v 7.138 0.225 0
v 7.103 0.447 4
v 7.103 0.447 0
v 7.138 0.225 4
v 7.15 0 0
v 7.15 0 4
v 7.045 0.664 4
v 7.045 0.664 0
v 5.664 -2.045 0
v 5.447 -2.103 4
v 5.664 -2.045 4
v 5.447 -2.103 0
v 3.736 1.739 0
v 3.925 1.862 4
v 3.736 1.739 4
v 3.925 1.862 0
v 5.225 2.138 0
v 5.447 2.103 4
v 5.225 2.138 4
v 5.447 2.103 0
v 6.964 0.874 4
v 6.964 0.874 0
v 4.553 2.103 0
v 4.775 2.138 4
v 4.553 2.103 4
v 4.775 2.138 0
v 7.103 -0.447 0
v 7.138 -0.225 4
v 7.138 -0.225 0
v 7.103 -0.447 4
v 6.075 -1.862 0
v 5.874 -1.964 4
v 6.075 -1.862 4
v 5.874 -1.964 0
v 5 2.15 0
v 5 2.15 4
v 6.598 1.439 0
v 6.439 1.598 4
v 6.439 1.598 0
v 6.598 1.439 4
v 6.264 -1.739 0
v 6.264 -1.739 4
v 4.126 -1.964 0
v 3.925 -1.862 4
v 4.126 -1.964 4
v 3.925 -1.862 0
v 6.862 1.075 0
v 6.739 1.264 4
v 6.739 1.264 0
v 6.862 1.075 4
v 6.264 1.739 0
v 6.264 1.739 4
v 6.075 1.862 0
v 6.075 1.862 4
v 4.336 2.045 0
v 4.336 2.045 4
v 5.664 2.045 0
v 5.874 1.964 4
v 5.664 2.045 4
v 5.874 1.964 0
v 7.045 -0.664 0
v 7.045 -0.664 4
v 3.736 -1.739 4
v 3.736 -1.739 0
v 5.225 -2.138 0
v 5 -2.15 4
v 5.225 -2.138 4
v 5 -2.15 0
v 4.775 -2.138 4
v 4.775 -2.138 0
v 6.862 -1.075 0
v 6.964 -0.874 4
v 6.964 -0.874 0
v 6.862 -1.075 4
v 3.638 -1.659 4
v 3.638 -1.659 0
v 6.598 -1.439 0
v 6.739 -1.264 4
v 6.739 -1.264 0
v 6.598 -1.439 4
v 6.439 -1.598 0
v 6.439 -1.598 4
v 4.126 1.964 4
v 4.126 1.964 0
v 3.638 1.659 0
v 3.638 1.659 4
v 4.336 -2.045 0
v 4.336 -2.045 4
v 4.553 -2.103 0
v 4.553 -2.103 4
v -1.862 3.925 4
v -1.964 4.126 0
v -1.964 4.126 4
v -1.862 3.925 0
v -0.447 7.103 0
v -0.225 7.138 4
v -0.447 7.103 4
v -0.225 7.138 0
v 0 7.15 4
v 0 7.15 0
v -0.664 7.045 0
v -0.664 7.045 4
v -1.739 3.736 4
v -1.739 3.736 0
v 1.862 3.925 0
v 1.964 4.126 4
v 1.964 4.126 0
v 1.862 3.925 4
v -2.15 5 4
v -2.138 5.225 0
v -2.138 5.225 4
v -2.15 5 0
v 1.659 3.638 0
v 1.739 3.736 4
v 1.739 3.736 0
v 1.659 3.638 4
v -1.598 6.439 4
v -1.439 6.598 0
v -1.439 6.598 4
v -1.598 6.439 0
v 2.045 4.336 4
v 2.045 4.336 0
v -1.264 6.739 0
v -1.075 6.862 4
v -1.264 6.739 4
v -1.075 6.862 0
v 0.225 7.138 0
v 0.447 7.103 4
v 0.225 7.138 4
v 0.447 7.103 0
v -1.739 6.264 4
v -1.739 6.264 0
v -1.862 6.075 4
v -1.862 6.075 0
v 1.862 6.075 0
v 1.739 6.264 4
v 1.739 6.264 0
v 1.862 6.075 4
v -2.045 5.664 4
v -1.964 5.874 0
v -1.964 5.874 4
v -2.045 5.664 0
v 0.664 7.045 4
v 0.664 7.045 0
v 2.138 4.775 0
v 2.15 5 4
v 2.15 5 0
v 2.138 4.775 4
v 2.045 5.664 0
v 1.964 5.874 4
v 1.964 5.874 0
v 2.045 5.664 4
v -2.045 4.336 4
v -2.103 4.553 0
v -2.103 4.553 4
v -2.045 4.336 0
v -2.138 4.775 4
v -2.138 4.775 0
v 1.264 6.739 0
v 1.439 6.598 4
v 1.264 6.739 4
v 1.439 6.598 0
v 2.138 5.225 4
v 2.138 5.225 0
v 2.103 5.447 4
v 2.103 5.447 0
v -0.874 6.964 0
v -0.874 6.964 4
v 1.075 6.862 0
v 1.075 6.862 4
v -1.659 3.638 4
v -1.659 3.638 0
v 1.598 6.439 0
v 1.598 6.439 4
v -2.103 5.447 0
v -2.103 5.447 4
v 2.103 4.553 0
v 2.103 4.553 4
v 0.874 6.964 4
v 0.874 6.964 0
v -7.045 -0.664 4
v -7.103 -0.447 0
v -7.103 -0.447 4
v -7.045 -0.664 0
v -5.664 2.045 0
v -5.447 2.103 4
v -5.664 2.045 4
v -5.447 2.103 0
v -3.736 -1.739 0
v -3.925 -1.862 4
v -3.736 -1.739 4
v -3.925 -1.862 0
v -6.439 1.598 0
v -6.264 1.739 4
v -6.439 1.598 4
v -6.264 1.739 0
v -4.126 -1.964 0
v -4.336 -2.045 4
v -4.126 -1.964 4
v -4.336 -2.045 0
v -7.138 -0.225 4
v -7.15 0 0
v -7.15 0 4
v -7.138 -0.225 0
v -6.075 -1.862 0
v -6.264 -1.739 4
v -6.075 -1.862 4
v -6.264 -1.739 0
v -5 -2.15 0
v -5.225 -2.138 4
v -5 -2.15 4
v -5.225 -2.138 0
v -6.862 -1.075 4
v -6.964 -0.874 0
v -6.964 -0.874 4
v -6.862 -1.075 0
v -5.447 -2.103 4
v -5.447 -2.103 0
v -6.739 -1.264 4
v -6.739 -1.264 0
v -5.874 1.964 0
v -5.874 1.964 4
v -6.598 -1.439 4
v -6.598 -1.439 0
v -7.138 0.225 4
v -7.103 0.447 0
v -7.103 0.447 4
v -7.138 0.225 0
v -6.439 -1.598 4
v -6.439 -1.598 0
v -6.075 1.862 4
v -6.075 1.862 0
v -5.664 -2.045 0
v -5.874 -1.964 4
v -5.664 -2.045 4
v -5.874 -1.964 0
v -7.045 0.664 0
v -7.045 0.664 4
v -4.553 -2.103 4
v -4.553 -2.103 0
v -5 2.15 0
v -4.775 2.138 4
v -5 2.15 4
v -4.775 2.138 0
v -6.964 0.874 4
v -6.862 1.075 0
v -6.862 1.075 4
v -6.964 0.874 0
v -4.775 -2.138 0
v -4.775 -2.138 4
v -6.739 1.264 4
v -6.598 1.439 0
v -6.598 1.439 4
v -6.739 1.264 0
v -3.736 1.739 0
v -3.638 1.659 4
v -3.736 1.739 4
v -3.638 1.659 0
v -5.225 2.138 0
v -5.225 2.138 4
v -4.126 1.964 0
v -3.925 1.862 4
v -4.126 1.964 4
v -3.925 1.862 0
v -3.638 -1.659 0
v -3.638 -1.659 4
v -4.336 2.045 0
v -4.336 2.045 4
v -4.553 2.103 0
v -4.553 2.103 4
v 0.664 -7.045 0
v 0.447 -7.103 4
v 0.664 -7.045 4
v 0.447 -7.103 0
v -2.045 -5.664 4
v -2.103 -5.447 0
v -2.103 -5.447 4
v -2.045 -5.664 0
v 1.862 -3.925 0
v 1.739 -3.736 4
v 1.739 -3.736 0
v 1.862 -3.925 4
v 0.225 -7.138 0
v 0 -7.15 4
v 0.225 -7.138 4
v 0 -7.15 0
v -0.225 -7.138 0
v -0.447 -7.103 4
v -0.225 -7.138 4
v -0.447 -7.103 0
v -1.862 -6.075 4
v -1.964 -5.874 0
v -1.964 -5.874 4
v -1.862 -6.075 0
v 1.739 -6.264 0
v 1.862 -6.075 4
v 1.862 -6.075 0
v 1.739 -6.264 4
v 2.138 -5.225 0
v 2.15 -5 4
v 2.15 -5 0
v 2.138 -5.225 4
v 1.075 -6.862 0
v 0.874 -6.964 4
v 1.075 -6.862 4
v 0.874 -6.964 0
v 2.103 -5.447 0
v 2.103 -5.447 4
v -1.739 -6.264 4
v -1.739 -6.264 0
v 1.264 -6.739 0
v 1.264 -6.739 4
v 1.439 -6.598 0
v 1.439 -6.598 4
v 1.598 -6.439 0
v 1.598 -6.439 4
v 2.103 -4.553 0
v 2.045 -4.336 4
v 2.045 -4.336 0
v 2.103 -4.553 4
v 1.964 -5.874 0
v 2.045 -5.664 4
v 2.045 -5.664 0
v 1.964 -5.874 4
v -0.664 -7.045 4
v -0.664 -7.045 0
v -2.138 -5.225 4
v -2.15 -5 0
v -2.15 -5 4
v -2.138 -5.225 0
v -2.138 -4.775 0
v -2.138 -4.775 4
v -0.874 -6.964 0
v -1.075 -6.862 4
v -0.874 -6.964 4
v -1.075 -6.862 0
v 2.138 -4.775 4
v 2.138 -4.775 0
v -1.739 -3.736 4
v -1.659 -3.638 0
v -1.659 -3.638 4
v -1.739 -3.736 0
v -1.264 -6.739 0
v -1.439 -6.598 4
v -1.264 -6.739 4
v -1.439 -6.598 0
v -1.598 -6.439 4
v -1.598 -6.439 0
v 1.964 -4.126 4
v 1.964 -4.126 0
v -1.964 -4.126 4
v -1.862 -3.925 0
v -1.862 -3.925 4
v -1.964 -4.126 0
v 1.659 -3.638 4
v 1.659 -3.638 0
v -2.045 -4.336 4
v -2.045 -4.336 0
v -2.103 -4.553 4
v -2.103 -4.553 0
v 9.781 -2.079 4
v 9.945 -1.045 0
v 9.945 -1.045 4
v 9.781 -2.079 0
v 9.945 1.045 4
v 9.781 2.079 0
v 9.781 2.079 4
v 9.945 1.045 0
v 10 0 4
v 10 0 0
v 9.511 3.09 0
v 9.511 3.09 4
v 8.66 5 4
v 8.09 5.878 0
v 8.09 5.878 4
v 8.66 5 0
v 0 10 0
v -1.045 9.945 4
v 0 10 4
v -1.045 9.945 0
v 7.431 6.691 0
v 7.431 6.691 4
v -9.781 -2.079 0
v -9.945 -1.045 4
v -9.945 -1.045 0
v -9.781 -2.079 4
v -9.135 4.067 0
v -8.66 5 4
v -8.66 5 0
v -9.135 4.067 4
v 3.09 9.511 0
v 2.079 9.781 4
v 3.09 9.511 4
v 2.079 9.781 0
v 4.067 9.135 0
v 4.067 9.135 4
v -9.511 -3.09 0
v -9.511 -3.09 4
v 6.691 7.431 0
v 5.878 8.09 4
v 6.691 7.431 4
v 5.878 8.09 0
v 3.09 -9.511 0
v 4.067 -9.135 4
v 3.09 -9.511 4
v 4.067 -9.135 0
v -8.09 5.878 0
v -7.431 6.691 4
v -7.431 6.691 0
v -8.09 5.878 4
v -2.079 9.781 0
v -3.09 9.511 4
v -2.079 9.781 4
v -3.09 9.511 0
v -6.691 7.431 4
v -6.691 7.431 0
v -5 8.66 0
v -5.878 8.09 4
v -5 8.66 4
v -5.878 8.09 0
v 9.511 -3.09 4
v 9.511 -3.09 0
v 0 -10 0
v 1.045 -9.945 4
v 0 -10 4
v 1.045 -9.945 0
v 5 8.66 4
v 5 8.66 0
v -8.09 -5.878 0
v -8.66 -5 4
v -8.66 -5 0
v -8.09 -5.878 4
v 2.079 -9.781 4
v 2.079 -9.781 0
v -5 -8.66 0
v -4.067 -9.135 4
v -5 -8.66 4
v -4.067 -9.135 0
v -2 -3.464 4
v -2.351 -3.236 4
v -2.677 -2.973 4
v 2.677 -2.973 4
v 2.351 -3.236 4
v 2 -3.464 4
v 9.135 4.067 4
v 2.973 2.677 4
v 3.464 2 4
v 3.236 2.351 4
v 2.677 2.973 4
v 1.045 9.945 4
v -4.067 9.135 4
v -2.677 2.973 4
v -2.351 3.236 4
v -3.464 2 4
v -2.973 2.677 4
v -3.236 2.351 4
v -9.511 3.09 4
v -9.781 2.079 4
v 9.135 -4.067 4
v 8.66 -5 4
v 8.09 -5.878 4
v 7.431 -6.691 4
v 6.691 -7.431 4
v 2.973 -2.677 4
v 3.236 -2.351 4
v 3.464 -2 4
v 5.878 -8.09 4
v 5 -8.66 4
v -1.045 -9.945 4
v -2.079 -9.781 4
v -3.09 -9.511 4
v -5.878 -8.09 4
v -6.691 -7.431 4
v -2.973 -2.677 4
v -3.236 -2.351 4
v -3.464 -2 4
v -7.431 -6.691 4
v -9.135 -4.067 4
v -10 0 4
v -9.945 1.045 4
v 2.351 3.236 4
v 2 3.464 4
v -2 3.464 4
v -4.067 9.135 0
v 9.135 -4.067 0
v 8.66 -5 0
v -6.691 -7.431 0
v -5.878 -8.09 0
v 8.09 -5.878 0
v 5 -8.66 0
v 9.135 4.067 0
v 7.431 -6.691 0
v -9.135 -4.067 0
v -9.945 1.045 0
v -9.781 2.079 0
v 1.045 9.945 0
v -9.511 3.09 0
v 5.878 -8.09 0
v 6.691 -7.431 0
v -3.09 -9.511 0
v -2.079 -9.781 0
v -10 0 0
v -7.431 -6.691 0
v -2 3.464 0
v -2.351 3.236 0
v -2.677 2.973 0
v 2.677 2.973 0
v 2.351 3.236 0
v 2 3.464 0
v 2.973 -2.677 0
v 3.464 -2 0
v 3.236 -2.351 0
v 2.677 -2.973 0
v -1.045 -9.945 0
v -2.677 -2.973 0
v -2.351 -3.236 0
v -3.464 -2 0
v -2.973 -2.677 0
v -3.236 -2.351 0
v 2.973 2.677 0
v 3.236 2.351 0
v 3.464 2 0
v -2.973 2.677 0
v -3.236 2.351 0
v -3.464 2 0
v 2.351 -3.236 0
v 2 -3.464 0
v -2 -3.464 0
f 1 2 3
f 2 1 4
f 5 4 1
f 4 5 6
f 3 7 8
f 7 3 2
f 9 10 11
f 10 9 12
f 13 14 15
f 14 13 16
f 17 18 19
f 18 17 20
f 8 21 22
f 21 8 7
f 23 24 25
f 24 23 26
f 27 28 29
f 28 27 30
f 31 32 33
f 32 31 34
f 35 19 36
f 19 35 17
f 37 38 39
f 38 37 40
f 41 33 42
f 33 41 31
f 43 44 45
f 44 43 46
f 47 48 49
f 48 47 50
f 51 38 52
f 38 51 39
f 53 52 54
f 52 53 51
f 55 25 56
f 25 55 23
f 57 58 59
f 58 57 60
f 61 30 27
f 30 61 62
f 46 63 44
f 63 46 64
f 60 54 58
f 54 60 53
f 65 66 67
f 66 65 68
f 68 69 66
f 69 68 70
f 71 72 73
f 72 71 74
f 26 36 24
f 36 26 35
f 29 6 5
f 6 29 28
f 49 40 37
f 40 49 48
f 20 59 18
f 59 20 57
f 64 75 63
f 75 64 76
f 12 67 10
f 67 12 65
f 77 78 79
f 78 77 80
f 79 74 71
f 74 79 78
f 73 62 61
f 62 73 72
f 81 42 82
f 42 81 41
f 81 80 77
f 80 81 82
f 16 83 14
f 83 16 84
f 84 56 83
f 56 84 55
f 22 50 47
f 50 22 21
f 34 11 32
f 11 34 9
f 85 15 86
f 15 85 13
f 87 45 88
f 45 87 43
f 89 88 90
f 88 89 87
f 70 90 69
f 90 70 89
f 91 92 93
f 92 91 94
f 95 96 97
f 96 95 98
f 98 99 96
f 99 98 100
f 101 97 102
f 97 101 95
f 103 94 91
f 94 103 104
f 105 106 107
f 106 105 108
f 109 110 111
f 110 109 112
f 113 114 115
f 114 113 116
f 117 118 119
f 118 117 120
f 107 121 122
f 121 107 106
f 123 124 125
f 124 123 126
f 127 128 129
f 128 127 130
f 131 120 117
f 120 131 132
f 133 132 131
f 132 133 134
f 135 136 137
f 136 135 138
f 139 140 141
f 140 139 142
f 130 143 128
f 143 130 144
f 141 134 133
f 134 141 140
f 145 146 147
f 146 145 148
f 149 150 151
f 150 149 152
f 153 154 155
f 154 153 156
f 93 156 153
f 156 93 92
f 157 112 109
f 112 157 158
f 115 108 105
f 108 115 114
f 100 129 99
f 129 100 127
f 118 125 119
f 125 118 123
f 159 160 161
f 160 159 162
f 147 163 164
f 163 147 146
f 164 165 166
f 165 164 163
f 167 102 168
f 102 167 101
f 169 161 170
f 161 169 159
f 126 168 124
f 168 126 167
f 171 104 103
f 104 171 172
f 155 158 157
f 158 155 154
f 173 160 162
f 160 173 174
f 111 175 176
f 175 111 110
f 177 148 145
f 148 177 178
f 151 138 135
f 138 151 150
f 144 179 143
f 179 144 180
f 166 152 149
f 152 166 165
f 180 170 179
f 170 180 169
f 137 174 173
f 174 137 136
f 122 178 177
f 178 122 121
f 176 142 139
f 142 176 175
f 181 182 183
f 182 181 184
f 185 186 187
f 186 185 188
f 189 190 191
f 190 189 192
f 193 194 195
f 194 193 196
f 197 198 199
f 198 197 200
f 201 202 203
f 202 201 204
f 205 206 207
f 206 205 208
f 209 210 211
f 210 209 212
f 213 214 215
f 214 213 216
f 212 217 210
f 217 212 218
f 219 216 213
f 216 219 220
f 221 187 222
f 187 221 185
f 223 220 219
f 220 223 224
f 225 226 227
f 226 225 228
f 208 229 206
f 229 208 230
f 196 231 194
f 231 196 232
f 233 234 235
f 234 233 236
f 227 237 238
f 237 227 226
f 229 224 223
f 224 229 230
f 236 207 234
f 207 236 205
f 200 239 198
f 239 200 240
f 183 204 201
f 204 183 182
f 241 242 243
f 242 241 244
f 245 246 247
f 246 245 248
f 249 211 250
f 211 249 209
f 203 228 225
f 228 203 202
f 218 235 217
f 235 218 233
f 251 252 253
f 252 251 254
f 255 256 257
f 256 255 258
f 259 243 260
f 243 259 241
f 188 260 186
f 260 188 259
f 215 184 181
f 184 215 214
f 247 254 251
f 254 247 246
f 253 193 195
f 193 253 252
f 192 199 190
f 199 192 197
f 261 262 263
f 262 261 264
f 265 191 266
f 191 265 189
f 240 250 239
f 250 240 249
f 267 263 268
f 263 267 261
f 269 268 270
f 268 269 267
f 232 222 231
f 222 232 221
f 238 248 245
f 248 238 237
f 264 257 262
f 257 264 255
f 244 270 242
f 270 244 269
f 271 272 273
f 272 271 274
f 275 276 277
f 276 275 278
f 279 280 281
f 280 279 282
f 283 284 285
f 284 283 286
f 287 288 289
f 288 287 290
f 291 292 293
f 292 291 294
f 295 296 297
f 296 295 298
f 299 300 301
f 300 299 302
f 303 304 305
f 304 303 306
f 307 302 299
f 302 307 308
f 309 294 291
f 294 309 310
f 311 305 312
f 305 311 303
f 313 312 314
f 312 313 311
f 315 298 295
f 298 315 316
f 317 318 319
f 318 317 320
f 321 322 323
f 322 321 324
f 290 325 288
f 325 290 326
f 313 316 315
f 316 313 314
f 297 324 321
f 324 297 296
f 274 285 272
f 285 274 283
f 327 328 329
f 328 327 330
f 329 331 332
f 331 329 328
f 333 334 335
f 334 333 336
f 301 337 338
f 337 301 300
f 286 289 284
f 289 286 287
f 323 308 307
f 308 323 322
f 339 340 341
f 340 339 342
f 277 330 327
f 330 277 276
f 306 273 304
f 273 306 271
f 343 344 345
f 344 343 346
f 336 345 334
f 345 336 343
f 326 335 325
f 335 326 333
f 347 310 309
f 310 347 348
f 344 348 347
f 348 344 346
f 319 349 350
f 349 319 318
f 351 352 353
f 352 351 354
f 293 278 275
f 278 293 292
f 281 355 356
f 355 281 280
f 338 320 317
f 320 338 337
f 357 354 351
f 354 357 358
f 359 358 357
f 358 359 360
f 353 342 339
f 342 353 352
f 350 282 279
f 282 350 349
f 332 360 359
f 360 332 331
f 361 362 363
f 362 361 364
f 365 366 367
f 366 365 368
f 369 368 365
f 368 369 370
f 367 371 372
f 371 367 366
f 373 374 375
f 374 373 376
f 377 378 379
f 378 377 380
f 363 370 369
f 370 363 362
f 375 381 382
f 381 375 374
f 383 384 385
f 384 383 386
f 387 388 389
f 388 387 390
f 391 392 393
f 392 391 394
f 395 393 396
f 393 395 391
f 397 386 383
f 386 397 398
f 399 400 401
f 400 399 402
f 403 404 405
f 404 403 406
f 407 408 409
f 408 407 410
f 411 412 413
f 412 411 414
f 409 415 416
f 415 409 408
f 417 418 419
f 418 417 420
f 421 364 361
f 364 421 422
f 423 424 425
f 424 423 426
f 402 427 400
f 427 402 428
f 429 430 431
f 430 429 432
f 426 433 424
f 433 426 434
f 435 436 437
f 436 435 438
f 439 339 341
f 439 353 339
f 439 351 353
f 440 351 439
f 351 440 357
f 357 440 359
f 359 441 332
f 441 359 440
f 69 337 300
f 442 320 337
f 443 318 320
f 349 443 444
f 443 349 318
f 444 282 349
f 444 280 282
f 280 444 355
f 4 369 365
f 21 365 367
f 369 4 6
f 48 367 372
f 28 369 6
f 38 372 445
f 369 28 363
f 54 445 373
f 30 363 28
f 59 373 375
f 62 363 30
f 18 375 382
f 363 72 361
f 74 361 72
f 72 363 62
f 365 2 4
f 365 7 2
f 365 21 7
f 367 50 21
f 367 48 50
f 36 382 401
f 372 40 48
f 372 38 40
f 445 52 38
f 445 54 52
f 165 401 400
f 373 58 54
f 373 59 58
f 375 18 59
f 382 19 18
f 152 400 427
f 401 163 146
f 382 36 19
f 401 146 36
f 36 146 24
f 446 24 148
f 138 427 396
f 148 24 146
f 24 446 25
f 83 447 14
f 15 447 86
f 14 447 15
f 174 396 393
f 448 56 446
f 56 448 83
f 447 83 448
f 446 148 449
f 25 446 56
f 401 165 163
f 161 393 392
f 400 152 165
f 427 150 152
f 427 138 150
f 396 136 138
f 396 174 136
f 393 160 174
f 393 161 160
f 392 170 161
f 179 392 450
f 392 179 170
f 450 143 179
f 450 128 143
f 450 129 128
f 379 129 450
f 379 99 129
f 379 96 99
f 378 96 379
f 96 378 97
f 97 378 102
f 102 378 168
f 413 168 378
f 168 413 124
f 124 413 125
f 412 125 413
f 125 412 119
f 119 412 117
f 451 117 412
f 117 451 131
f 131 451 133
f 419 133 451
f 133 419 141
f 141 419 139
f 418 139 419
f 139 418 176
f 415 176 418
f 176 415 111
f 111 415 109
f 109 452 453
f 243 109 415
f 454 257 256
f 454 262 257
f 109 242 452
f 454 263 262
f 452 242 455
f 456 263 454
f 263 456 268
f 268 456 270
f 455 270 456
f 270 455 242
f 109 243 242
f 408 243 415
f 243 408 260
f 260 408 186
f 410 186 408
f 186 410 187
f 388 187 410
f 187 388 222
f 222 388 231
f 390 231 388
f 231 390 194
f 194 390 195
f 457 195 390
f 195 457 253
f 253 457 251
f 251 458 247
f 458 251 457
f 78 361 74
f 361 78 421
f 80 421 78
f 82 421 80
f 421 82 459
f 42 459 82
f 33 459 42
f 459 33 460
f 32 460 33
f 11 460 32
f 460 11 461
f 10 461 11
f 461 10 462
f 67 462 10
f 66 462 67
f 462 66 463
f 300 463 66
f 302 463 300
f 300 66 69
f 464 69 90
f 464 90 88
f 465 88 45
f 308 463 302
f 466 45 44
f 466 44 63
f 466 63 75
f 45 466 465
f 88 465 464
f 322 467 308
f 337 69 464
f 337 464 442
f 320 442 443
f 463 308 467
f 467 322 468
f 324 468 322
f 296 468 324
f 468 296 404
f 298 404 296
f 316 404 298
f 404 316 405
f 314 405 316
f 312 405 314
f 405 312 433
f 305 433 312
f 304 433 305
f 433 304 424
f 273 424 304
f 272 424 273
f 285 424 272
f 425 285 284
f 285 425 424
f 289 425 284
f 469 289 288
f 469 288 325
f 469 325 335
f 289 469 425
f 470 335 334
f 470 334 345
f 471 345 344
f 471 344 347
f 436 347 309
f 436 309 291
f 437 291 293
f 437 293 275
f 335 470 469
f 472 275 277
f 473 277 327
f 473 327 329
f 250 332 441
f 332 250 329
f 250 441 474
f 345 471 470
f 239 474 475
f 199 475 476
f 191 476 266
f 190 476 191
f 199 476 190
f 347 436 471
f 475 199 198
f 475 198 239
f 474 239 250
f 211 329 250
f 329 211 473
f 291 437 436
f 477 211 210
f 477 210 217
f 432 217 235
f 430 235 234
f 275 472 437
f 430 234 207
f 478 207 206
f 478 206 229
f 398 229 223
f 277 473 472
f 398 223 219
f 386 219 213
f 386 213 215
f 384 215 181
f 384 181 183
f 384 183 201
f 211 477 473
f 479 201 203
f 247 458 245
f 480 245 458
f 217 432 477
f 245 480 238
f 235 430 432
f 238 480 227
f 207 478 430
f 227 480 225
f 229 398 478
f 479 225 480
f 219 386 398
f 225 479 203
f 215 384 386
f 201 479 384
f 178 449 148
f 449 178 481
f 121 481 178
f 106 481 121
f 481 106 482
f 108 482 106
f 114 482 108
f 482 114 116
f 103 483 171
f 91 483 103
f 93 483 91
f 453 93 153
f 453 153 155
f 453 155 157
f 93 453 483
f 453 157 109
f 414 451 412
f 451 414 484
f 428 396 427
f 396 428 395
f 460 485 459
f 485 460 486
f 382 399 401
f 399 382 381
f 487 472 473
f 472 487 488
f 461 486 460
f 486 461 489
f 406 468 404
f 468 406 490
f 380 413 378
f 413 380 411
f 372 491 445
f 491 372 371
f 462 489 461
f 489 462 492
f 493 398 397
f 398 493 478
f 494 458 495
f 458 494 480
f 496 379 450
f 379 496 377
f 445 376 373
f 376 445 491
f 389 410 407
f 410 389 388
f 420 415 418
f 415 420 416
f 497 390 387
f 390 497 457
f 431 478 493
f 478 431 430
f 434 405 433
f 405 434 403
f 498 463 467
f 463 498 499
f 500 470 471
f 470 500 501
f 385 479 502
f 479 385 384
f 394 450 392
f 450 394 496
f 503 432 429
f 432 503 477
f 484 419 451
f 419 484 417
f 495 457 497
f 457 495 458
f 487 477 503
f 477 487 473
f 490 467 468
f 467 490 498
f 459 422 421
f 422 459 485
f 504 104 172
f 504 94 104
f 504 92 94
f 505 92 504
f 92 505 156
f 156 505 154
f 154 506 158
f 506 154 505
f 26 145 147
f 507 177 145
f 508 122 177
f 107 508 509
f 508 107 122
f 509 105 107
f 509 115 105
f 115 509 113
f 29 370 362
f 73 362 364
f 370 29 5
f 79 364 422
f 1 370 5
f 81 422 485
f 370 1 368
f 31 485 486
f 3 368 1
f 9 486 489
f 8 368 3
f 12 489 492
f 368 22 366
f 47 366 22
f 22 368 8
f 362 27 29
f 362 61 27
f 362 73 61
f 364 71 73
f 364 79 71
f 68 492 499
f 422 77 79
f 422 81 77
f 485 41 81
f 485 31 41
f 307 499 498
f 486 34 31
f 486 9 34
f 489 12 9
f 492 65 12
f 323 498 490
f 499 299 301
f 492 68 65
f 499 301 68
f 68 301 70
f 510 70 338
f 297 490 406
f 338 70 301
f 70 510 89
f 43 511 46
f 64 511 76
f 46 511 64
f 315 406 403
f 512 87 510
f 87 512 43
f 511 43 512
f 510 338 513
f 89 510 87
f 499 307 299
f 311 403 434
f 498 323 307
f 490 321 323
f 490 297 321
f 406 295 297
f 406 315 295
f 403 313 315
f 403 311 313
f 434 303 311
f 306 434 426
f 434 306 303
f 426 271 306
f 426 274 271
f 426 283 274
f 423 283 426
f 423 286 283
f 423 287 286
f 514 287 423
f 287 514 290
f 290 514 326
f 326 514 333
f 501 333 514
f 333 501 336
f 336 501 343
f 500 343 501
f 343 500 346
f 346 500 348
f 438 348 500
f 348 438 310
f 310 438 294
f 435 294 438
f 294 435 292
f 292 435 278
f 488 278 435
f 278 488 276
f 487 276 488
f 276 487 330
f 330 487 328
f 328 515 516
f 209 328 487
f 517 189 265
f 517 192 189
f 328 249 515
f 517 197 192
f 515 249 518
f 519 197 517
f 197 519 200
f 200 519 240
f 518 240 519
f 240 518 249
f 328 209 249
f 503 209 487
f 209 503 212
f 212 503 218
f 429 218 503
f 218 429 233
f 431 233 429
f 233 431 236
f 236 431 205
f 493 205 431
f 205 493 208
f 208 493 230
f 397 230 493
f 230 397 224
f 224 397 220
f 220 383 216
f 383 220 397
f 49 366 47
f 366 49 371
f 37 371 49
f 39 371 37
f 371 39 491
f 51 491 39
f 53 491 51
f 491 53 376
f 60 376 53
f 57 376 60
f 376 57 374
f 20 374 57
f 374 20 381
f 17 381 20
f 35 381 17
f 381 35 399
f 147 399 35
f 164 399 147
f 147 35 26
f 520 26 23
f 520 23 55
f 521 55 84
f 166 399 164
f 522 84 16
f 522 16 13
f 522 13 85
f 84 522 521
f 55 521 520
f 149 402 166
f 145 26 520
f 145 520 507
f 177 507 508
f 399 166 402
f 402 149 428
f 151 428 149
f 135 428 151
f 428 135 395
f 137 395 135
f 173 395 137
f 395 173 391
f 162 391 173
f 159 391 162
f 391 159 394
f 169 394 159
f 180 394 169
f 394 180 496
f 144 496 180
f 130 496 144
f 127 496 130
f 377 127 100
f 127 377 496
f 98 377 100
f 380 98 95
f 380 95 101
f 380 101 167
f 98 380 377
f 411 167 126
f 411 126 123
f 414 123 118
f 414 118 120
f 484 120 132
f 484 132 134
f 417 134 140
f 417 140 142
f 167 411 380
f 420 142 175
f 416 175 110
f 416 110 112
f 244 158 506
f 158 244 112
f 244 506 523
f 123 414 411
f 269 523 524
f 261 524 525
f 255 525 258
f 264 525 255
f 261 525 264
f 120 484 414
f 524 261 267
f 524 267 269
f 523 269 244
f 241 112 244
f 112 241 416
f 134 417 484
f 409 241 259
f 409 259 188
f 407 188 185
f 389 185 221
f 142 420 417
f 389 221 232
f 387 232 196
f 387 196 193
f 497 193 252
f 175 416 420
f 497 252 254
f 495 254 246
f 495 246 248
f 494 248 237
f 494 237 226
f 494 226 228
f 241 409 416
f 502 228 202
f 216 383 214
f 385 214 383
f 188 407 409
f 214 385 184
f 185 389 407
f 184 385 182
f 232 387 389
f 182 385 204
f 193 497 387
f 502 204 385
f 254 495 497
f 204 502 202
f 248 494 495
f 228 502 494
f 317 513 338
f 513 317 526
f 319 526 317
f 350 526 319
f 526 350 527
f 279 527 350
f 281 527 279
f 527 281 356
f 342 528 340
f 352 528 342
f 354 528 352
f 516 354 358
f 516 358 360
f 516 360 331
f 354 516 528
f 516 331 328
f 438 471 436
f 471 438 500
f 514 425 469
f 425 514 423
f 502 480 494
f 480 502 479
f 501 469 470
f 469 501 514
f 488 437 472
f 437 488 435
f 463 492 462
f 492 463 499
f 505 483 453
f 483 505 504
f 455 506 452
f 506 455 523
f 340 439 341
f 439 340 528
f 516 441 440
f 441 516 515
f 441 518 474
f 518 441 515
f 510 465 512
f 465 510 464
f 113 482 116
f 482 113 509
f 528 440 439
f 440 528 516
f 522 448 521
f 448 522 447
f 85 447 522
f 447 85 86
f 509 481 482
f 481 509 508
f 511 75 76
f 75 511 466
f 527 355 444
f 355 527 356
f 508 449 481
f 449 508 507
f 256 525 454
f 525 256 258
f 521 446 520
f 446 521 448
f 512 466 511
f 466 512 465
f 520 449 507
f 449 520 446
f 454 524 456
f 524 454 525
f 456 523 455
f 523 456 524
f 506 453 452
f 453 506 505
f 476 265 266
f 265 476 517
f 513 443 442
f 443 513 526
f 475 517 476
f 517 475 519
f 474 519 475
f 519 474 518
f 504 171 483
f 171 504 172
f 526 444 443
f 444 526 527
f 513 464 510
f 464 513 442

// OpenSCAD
// Shaft-seal holder plate.
$fn = 60;
eps = 0.02;
seal_d = 8;
outer_d = 20;
plate_t = 4;
difference() { cylinder(d=outer_d,h=plate_t); translate([0,0,-eps]) cylinder(d=seal_d,h=plate_t+2*eps); for(i=[0:3]) rotate([0,0,i*90]) translate([outer_d/2-5,0,-eps]) cylinder(d=4.3,h=plate_t+2*eps); }
